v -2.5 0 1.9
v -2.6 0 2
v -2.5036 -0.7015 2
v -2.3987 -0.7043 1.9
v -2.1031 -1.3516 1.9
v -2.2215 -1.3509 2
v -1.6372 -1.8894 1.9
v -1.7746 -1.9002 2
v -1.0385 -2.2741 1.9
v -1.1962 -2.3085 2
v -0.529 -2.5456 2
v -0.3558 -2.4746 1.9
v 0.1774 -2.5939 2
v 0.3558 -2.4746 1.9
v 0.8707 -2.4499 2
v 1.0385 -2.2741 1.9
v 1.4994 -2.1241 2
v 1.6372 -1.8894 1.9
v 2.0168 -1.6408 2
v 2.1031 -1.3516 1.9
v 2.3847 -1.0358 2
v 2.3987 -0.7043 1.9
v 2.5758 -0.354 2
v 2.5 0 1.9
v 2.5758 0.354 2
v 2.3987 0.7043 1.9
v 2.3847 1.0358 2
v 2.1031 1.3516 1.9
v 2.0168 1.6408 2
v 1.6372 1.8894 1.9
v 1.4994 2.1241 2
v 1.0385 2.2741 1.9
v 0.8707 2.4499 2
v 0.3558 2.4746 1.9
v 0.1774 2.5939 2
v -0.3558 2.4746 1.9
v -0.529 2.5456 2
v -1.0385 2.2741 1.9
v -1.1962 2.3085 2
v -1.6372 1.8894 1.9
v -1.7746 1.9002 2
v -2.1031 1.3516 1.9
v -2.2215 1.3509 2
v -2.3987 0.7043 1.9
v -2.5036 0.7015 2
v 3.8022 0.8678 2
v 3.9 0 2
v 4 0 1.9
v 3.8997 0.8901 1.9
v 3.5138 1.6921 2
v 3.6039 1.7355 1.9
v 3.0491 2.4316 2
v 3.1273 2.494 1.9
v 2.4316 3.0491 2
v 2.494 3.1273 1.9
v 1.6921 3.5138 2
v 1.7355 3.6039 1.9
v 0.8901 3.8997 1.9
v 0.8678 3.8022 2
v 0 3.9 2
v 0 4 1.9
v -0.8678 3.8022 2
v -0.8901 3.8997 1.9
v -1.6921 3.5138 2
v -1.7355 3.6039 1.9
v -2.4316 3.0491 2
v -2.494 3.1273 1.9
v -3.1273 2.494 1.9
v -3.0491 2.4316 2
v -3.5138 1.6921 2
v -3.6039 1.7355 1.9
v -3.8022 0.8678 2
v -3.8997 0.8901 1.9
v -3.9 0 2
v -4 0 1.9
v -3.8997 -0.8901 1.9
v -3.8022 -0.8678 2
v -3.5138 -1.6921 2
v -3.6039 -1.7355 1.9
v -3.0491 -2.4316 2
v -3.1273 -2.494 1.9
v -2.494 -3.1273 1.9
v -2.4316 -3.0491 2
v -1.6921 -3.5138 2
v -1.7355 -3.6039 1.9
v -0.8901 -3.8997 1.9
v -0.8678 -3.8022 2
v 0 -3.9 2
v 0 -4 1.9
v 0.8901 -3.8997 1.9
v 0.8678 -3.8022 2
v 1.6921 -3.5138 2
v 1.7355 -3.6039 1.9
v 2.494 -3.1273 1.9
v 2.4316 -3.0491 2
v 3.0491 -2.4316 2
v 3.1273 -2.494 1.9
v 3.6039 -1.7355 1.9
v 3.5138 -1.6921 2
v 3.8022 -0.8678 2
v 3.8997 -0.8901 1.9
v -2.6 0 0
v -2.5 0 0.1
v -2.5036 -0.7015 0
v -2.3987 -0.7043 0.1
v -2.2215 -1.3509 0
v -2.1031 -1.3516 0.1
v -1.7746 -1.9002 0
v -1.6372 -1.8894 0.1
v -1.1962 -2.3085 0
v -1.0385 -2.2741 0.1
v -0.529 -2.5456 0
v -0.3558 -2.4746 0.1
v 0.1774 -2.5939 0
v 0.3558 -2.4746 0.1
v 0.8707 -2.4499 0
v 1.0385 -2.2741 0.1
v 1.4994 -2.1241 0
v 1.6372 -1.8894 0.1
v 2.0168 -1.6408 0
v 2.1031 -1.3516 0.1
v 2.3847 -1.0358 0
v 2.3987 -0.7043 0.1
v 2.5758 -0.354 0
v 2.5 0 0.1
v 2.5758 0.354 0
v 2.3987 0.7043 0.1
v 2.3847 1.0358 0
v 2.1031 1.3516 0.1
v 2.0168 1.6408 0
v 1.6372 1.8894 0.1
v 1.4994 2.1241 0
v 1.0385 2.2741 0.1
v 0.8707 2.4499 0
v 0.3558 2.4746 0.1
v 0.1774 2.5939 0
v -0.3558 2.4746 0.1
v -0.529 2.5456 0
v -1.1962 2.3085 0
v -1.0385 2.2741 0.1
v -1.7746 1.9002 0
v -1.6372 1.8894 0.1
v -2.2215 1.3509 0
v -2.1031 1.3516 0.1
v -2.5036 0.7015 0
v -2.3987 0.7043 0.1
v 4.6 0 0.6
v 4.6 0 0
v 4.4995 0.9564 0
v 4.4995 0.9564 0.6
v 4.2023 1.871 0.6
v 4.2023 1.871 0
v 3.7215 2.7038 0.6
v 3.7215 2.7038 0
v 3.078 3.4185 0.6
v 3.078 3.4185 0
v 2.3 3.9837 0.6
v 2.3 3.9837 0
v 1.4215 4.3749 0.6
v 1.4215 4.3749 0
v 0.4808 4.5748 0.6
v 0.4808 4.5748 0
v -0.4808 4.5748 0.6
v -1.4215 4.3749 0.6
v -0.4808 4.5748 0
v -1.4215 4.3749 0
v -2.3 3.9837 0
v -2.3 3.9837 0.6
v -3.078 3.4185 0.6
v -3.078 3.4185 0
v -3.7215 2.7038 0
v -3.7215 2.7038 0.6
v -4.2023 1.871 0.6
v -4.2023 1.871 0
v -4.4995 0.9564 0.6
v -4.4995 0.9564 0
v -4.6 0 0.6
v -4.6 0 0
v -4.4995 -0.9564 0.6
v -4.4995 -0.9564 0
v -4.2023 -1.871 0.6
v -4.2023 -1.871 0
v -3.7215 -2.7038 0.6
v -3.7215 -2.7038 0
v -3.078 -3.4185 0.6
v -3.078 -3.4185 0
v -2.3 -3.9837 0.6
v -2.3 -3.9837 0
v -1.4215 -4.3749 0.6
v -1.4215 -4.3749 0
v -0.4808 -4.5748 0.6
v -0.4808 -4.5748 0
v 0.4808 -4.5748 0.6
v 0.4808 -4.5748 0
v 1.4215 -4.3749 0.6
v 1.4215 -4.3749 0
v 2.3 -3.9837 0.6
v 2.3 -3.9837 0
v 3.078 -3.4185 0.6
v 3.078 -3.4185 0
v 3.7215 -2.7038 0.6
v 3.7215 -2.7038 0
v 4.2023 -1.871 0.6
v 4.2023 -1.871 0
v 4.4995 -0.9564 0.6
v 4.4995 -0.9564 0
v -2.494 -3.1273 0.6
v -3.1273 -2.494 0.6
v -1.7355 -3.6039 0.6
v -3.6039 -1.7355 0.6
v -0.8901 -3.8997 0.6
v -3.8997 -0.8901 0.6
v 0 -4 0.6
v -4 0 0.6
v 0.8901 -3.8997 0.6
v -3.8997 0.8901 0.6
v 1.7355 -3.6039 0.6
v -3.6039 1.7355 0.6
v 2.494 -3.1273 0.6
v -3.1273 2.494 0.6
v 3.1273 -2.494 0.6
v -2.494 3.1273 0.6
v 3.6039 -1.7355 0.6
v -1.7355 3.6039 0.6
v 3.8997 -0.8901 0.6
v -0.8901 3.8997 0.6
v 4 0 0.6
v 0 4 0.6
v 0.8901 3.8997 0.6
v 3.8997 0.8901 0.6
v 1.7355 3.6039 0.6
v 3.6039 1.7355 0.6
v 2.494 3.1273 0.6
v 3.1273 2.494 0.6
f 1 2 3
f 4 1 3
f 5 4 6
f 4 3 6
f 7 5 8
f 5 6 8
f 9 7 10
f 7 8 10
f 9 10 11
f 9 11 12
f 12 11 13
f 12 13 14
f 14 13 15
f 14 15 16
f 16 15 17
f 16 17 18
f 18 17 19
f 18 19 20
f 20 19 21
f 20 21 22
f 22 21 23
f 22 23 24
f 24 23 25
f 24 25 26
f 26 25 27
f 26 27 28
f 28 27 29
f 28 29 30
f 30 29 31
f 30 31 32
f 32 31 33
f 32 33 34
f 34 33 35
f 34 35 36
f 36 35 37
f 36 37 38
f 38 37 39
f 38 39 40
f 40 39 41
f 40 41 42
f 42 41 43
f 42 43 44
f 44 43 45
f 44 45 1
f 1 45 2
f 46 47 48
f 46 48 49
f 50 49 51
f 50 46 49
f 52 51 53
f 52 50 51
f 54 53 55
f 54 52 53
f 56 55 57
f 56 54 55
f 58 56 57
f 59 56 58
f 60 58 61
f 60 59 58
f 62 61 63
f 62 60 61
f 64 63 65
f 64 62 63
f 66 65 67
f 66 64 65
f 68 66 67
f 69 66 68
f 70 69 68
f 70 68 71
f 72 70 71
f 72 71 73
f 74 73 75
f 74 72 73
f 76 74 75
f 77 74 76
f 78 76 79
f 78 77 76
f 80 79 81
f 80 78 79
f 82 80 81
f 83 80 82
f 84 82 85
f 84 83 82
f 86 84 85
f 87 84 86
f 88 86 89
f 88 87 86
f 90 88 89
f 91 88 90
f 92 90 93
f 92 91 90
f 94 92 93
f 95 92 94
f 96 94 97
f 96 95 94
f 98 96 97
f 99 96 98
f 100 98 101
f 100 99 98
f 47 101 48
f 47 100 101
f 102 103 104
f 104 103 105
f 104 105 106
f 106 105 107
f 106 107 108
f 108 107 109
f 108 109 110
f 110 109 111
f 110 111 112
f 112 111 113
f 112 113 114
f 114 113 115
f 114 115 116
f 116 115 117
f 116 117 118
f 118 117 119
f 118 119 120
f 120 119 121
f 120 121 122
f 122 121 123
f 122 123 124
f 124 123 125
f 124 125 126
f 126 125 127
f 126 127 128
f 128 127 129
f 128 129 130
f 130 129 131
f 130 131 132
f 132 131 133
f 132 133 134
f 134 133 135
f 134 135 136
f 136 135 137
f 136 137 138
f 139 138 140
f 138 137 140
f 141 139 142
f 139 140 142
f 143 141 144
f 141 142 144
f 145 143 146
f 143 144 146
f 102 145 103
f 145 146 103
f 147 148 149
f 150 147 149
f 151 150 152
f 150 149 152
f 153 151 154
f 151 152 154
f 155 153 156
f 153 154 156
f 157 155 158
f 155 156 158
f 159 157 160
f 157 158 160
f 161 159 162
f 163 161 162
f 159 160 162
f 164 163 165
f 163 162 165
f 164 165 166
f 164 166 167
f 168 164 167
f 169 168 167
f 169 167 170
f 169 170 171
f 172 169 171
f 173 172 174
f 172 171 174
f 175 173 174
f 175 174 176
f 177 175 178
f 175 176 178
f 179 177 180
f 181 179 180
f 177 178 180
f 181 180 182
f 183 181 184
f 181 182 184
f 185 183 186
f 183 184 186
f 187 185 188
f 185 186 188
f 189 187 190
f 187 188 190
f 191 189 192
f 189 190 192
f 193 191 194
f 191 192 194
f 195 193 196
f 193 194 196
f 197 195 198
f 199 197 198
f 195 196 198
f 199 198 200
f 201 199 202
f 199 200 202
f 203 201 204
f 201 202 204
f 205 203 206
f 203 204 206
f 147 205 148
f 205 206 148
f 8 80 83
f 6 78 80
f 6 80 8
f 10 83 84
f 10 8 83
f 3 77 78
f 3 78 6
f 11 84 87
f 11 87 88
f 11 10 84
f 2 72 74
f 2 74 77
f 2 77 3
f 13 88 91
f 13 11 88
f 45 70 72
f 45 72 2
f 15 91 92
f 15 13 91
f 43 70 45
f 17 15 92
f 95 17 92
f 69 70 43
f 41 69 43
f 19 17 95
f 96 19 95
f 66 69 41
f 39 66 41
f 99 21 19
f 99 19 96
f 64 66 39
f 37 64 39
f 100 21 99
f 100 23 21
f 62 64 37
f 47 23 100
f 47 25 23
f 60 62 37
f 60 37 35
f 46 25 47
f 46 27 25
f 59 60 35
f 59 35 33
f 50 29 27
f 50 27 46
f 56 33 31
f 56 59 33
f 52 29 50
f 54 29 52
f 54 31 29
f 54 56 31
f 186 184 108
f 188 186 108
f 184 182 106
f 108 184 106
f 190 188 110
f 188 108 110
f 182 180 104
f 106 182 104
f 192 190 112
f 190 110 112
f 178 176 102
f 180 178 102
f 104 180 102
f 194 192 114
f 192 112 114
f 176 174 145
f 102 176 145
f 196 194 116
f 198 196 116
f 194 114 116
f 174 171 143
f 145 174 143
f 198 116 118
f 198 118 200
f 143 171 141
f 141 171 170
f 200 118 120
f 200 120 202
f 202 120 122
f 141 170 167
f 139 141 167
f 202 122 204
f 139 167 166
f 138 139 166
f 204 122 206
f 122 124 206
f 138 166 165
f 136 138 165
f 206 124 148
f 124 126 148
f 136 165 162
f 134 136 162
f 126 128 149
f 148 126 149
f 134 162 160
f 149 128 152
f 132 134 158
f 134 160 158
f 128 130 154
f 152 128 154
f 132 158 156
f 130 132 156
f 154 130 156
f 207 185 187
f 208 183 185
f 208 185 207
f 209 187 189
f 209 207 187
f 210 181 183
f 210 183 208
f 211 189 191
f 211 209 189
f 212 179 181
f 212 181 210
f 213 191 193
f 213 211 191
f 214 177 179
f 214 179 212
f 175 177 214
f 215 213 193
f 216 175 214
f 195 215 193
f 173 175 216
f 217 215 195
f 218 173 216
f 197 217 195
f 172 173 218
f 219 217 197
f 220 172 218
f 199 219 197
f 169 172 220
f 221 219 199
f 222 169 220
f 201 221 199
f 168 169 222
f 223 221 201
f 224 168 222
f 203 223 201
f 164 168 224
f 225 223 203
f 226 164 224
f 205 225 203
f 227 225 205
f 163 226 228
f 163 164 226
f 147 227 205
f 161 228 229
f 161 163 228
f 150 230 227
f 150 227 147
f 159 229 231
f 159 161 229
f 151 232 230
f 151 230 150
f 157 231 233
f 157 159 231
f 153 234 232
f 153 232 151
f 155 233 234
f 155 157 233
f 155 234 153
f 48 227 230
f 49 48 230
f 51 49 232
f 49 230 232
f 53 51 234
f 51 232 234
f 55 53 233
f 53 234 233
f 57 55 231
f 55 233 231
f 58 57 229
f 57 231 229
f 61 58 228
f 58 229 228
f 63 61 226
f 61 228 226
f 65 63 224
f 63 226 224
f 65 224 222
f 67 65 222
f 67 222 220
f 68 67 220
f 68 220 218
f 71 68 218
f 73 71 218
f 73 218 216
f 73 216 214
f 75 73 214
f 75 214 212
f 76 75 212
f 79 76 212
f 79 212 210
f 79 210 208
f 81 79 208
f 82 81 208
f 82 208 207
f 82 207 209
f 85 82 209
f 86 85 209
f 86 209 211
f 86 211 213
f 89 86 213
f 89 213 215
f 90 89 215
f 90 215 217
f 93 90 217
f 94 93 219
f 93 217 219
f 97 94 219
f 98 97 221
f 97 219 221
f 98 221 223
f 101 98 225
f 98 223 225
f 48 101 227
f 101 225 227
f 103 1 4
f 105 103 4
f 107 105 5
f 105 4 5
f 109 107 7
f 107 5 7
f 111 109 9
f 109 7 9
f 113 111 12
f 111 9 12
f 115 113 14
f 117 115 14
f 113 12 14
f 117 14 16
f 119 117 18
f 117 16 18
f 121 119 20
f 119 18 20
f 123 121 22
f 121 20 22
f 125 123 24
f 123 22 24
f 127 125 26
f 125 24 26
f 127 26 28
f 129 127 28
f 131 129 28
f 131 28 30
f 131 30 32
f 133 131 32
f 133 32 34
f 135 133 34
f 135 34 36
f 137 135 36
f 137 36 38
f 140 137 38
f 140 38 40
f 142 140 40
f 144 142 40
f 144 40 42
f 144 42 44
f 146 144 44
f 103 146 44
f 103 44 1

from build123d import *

# Parameters (mm, degrees)
F0_R     = 4
F1_DEPTH = 2
F0_R_2   = 4.6
F2_DEPTH = 0.6
F3_D     = 5
F4_SIZE  = 0.1


with BuildPart() as f1:
    # F0 (on Top) → F1 (new body)
    with BuildSketch(Plane.XY):
        Circle(F0_R)
    extrude(amount=F1_DEPTH)

    # F0 (on Top) → F2 (join)
    with BuildSketch(Plane.XY):
        Circle(F0_R_2)
        Circle(F0_R, mode=Mode.SUBTRACT)
    extrude(amount=F2_DEPTH)

    # F3 (through all)
    with Locations(Plane(origin=(0, 0, 0), x_dir=(1, 0, 0), z_dir=(0, 0, -1))):
        with Locations((0, 0)):
            Hole(F3_D / 2)

    # F4
    f4_edges = [f1.edges().sort_by_distance(p)[0] for p in [
        (-4, 0, 2),
        (-2.5, 0, 2),
        (-2.5, 0, 0),
    ]]
    chamfer(f4_edges, length=F4_SIZE)


solid = f1.part
